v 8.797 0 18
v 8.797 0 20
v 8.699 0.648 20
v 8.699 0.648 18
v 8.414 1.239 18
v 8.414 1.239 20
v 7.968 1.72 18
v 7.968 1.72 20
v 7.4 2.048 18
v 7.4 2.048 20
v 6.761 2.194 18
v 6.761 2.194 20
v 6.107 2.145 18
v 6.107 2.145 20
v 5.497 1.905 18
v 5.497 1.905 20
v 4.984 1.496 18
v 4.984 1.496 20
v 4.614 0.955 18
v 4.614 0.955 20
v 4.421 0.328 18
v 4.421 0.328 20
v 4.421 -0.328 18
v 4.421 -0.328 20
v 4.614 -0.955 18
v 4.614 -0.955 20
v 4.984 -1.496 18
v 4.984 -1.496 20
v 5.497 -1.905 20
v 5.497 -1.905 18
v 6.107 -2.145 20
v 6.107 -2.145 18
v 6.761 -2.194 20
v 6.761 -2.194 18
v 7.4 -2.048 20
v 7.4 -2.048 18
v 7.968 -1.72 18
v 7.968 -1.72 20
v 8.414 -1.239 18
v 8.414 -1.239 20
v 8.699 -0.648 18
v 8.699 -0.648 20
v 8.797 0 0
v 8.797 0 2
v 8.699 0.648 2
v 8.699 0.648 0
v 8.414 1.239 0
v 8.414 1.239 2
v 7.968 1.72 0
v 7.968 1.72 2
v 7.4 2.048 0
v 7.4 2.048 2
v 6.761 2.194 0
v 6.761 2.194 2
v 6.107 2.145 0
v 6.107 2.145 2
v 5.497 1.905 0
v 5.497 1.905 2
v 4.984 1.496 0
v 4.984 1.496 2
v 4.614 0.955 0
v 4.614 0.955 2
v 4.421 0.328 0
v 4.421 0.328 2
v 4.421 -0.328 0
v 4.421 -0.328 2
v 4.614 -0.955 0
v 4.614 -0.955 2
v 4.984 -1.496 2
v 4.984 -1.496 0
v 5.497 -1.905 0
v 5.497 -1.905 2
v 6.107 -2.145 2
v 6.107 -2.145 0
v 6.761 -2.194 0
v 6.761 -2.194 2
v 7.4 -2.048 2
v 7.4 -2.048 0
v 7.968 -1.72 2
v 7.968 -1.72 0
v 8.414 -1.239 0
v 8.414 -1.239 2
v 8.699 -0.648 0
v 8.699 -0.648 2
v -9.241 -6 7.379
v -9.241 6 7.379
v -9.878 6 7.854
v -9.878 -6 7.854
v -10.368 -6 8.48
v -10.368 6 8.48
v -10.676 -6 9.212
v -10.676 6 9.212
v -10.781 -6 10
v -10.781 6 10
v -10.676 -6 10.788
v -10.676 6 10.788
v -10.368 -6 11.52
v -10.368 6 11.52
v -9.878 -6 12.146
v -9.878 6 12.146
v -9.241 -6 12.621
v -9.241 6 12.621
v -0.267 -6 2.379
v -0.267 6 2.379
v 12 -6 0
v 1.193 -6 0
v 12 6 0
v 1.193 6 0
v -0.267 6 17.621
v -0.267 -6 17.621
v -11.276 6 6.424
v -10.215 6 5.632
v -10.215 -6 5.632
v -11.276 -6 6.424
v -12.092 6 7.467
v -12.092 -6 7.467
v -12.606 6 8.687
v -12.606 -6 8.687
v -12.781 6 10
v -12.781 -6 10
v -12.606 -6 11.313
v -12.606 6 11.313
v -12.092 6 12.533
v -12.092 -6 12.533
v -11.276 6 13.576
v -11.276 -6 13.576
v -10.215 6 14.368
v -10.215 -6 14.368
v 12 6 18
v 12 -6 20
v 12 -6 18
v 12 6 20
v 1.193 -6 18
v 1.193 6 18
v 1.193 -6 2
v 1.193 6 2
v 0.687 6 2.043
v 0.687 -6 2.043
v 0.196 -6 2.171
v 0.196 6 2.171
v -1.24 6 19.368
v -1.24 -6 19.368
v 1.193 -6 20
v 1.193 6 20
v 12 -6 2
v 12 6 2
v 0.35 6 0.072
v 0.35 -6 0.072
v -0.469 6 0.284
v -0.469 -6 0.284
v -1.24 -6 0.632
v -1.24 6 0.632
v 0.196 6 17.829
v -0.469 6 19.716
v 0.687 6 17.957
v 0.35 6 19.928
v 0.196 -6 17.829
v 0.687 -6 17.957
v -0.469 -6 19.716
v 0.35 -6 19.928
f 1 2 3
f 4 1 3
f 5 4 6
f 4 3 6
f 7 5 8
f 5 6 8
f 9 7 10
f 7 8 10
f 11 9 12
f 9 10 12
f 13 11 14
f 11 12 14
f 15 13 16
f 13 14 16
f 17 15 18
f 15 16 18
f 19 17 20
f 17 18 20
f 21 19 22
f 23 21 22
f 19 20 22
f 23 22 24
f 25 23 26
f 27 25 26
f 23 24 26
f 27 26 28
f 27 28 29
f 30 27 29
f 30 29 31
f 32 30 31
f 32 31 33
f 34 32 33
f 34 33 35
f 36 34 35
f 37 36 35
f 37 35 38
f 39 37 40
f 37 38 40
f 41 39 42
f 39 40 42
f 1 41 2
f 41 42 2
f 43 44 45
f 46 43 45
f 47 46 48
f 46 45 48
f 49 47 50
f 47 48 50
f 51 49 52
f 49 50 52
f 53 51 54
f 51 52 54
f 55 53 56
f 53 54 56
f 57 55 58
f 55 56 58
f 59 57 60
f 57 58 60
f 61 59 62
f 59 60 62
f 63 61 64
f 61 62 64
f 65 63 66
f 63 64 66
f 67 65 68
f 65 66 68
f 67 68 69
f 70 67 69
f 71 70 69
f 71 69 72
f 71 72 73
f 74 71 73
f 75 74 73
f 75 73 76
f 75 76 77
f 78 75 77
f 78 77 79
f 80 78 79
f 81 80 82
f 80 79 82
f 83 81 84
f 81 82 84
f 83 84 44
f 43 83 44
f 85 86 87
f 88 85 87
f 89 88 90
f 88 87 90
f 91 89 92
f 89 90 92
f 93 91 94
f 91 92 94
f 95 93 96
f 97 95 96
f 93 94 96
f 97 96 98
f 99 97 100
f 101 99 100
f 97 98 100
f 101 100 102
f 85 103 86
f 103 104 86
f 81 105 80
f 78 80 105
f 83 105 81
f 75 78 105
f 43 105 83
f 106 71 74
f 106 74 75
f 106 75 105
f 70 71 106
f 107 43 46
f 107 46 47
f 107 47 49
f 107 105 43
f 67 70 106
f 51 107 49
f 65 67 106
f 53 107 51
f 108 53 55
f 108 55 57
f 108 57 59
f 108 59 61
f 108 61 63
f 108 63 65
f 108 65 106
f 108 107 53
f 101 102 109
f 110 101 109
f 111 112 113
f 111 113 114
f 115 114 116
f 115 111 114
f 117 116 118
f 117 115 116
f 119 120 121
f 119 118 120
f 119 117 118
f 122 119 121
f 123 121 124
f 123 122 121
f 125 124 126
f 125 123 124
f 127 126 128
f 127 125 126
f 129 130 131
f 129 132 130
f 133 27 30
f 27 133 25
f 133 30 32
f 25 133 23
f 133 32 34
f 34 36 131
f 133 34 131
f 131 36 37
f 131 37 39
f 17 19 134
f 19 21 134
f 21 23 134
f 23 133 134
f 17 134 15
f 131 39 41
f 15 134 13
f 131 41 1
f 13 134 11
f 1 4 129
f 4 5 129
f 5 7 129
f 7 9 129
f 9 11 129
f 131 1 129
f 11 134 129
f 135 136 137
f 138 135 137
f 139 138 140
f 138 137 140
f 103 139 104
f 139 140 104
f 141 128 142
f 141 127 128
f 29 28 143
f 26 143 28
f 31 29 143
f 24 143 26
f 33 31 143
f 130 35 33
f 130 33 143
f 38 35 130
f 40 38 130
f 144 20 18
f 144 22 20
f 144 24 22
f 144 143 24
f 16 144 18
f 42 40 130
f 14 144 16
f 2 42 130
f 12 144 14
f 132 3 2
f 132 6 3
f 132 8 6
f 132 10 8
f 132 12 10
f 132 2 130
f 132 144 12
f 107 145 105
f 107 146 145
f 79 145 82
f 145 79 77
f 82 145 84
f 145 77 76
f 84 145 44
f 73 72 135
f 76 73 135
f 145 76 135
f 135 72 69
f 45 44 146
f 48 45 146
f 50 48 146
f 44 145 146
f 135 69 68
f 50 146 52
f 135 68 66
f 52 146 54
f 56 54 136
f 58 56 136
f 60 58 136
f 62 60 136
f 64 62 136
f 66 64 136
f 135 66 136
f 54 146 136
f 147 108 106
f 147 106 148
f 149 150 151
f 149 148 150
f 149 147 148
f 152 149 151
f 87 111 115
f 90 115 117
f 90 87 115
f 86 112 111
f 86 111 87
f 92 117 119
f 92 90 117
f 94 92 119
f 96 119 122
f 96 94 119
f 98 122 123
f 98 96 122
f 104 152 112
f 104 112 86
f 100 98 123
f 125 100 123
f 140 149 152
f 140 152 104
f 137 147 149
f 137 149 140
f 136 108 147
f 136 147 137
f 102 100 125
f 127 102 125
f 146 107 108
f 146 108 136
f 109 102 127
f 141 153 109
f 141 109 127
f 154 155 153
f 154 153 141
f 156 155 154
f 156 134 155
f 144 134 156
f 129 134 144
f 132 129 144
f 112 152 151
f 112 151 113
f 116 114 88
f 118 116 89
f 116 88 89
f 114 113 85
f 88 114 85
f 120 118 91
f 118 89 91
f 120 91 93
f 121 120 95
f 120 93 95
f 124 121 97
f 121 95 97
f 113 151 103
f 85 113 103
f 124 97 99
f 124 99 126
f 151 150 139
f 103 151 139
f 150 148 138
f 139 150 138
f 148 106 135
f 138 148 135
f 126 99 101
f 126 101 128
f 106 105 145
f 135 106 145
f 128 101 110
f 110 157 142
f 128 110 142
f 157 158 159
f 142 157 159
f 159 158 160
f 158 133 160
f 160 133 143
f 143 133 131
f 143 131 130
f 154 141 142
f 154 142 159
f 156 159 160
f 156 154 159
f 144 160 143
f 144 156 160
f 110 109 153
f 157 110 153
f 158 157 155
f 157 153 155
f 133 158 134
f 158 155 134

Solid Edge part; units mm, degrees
sketch "Sketch1" plane through (0, 0, 0) normal (0, -1, 0) x (1, 0, 0)
  line L0 (1.1931, 20) -> (12, 20)
  arc A0 (1.1931, 20) -> (-1.2404, 19.3679) centre (1.1931, 15) ccw
  line L1 (-10.2148, 14.3679) -> (-1.2404, 19.3679)
  arc A1 (-10.2148, 14.3679) -> (-10.2148, 5.6321) centre (-7.7813, 10) ccw
  line L2 (-1.2404, 0.6321) -> (-10.2148, 5.6321)
  arc A2 (-1.2404, 0.6321) -> (1.1931, 0) centre (1.1931, 5) ccw
  line L3 (12, 0) -> (1.1931, 0)
  line L4 (12, 2) -> (12, 0)
  line L5 (12, 2) -> (1.1931, 2)
  arc A3 (1.1931, 2) -> (-0.267, 2.3793) centre (1.1931, 5) cw
  line L6 (-0.267, 2.3793) -> (-9.2414, 7.3793)
  arc A4 (-9.2414, 7.3793) -> (-9.2414, 12.6207) centre (-7.7813, 10) cw
  line L7 (-9.2414, 12.6207) -> (-0.267, 17.6207)
  arc A5 (-0.267, 17.6207) -> (1.1931, 18) centre (1.1931, 15) cw
  line L8 (1.1931, 18) -> (12, 18)
  line L9 (12, 20) -> (12, 18)
  dimension "D1" = 16
  dimension "D2" = 1
extrude "Protrusion1" add sketch "Sketch1" along normal mid plane 12
sketch "Sketch2" plane through (6.5966, 0, 20) normal (0, 0, 1) x (1, 0, 0)
  circle A0 centre (0, 0) radius 2.2
extrude "Cutout1" cut sketch "Sketch2" against normal through all
